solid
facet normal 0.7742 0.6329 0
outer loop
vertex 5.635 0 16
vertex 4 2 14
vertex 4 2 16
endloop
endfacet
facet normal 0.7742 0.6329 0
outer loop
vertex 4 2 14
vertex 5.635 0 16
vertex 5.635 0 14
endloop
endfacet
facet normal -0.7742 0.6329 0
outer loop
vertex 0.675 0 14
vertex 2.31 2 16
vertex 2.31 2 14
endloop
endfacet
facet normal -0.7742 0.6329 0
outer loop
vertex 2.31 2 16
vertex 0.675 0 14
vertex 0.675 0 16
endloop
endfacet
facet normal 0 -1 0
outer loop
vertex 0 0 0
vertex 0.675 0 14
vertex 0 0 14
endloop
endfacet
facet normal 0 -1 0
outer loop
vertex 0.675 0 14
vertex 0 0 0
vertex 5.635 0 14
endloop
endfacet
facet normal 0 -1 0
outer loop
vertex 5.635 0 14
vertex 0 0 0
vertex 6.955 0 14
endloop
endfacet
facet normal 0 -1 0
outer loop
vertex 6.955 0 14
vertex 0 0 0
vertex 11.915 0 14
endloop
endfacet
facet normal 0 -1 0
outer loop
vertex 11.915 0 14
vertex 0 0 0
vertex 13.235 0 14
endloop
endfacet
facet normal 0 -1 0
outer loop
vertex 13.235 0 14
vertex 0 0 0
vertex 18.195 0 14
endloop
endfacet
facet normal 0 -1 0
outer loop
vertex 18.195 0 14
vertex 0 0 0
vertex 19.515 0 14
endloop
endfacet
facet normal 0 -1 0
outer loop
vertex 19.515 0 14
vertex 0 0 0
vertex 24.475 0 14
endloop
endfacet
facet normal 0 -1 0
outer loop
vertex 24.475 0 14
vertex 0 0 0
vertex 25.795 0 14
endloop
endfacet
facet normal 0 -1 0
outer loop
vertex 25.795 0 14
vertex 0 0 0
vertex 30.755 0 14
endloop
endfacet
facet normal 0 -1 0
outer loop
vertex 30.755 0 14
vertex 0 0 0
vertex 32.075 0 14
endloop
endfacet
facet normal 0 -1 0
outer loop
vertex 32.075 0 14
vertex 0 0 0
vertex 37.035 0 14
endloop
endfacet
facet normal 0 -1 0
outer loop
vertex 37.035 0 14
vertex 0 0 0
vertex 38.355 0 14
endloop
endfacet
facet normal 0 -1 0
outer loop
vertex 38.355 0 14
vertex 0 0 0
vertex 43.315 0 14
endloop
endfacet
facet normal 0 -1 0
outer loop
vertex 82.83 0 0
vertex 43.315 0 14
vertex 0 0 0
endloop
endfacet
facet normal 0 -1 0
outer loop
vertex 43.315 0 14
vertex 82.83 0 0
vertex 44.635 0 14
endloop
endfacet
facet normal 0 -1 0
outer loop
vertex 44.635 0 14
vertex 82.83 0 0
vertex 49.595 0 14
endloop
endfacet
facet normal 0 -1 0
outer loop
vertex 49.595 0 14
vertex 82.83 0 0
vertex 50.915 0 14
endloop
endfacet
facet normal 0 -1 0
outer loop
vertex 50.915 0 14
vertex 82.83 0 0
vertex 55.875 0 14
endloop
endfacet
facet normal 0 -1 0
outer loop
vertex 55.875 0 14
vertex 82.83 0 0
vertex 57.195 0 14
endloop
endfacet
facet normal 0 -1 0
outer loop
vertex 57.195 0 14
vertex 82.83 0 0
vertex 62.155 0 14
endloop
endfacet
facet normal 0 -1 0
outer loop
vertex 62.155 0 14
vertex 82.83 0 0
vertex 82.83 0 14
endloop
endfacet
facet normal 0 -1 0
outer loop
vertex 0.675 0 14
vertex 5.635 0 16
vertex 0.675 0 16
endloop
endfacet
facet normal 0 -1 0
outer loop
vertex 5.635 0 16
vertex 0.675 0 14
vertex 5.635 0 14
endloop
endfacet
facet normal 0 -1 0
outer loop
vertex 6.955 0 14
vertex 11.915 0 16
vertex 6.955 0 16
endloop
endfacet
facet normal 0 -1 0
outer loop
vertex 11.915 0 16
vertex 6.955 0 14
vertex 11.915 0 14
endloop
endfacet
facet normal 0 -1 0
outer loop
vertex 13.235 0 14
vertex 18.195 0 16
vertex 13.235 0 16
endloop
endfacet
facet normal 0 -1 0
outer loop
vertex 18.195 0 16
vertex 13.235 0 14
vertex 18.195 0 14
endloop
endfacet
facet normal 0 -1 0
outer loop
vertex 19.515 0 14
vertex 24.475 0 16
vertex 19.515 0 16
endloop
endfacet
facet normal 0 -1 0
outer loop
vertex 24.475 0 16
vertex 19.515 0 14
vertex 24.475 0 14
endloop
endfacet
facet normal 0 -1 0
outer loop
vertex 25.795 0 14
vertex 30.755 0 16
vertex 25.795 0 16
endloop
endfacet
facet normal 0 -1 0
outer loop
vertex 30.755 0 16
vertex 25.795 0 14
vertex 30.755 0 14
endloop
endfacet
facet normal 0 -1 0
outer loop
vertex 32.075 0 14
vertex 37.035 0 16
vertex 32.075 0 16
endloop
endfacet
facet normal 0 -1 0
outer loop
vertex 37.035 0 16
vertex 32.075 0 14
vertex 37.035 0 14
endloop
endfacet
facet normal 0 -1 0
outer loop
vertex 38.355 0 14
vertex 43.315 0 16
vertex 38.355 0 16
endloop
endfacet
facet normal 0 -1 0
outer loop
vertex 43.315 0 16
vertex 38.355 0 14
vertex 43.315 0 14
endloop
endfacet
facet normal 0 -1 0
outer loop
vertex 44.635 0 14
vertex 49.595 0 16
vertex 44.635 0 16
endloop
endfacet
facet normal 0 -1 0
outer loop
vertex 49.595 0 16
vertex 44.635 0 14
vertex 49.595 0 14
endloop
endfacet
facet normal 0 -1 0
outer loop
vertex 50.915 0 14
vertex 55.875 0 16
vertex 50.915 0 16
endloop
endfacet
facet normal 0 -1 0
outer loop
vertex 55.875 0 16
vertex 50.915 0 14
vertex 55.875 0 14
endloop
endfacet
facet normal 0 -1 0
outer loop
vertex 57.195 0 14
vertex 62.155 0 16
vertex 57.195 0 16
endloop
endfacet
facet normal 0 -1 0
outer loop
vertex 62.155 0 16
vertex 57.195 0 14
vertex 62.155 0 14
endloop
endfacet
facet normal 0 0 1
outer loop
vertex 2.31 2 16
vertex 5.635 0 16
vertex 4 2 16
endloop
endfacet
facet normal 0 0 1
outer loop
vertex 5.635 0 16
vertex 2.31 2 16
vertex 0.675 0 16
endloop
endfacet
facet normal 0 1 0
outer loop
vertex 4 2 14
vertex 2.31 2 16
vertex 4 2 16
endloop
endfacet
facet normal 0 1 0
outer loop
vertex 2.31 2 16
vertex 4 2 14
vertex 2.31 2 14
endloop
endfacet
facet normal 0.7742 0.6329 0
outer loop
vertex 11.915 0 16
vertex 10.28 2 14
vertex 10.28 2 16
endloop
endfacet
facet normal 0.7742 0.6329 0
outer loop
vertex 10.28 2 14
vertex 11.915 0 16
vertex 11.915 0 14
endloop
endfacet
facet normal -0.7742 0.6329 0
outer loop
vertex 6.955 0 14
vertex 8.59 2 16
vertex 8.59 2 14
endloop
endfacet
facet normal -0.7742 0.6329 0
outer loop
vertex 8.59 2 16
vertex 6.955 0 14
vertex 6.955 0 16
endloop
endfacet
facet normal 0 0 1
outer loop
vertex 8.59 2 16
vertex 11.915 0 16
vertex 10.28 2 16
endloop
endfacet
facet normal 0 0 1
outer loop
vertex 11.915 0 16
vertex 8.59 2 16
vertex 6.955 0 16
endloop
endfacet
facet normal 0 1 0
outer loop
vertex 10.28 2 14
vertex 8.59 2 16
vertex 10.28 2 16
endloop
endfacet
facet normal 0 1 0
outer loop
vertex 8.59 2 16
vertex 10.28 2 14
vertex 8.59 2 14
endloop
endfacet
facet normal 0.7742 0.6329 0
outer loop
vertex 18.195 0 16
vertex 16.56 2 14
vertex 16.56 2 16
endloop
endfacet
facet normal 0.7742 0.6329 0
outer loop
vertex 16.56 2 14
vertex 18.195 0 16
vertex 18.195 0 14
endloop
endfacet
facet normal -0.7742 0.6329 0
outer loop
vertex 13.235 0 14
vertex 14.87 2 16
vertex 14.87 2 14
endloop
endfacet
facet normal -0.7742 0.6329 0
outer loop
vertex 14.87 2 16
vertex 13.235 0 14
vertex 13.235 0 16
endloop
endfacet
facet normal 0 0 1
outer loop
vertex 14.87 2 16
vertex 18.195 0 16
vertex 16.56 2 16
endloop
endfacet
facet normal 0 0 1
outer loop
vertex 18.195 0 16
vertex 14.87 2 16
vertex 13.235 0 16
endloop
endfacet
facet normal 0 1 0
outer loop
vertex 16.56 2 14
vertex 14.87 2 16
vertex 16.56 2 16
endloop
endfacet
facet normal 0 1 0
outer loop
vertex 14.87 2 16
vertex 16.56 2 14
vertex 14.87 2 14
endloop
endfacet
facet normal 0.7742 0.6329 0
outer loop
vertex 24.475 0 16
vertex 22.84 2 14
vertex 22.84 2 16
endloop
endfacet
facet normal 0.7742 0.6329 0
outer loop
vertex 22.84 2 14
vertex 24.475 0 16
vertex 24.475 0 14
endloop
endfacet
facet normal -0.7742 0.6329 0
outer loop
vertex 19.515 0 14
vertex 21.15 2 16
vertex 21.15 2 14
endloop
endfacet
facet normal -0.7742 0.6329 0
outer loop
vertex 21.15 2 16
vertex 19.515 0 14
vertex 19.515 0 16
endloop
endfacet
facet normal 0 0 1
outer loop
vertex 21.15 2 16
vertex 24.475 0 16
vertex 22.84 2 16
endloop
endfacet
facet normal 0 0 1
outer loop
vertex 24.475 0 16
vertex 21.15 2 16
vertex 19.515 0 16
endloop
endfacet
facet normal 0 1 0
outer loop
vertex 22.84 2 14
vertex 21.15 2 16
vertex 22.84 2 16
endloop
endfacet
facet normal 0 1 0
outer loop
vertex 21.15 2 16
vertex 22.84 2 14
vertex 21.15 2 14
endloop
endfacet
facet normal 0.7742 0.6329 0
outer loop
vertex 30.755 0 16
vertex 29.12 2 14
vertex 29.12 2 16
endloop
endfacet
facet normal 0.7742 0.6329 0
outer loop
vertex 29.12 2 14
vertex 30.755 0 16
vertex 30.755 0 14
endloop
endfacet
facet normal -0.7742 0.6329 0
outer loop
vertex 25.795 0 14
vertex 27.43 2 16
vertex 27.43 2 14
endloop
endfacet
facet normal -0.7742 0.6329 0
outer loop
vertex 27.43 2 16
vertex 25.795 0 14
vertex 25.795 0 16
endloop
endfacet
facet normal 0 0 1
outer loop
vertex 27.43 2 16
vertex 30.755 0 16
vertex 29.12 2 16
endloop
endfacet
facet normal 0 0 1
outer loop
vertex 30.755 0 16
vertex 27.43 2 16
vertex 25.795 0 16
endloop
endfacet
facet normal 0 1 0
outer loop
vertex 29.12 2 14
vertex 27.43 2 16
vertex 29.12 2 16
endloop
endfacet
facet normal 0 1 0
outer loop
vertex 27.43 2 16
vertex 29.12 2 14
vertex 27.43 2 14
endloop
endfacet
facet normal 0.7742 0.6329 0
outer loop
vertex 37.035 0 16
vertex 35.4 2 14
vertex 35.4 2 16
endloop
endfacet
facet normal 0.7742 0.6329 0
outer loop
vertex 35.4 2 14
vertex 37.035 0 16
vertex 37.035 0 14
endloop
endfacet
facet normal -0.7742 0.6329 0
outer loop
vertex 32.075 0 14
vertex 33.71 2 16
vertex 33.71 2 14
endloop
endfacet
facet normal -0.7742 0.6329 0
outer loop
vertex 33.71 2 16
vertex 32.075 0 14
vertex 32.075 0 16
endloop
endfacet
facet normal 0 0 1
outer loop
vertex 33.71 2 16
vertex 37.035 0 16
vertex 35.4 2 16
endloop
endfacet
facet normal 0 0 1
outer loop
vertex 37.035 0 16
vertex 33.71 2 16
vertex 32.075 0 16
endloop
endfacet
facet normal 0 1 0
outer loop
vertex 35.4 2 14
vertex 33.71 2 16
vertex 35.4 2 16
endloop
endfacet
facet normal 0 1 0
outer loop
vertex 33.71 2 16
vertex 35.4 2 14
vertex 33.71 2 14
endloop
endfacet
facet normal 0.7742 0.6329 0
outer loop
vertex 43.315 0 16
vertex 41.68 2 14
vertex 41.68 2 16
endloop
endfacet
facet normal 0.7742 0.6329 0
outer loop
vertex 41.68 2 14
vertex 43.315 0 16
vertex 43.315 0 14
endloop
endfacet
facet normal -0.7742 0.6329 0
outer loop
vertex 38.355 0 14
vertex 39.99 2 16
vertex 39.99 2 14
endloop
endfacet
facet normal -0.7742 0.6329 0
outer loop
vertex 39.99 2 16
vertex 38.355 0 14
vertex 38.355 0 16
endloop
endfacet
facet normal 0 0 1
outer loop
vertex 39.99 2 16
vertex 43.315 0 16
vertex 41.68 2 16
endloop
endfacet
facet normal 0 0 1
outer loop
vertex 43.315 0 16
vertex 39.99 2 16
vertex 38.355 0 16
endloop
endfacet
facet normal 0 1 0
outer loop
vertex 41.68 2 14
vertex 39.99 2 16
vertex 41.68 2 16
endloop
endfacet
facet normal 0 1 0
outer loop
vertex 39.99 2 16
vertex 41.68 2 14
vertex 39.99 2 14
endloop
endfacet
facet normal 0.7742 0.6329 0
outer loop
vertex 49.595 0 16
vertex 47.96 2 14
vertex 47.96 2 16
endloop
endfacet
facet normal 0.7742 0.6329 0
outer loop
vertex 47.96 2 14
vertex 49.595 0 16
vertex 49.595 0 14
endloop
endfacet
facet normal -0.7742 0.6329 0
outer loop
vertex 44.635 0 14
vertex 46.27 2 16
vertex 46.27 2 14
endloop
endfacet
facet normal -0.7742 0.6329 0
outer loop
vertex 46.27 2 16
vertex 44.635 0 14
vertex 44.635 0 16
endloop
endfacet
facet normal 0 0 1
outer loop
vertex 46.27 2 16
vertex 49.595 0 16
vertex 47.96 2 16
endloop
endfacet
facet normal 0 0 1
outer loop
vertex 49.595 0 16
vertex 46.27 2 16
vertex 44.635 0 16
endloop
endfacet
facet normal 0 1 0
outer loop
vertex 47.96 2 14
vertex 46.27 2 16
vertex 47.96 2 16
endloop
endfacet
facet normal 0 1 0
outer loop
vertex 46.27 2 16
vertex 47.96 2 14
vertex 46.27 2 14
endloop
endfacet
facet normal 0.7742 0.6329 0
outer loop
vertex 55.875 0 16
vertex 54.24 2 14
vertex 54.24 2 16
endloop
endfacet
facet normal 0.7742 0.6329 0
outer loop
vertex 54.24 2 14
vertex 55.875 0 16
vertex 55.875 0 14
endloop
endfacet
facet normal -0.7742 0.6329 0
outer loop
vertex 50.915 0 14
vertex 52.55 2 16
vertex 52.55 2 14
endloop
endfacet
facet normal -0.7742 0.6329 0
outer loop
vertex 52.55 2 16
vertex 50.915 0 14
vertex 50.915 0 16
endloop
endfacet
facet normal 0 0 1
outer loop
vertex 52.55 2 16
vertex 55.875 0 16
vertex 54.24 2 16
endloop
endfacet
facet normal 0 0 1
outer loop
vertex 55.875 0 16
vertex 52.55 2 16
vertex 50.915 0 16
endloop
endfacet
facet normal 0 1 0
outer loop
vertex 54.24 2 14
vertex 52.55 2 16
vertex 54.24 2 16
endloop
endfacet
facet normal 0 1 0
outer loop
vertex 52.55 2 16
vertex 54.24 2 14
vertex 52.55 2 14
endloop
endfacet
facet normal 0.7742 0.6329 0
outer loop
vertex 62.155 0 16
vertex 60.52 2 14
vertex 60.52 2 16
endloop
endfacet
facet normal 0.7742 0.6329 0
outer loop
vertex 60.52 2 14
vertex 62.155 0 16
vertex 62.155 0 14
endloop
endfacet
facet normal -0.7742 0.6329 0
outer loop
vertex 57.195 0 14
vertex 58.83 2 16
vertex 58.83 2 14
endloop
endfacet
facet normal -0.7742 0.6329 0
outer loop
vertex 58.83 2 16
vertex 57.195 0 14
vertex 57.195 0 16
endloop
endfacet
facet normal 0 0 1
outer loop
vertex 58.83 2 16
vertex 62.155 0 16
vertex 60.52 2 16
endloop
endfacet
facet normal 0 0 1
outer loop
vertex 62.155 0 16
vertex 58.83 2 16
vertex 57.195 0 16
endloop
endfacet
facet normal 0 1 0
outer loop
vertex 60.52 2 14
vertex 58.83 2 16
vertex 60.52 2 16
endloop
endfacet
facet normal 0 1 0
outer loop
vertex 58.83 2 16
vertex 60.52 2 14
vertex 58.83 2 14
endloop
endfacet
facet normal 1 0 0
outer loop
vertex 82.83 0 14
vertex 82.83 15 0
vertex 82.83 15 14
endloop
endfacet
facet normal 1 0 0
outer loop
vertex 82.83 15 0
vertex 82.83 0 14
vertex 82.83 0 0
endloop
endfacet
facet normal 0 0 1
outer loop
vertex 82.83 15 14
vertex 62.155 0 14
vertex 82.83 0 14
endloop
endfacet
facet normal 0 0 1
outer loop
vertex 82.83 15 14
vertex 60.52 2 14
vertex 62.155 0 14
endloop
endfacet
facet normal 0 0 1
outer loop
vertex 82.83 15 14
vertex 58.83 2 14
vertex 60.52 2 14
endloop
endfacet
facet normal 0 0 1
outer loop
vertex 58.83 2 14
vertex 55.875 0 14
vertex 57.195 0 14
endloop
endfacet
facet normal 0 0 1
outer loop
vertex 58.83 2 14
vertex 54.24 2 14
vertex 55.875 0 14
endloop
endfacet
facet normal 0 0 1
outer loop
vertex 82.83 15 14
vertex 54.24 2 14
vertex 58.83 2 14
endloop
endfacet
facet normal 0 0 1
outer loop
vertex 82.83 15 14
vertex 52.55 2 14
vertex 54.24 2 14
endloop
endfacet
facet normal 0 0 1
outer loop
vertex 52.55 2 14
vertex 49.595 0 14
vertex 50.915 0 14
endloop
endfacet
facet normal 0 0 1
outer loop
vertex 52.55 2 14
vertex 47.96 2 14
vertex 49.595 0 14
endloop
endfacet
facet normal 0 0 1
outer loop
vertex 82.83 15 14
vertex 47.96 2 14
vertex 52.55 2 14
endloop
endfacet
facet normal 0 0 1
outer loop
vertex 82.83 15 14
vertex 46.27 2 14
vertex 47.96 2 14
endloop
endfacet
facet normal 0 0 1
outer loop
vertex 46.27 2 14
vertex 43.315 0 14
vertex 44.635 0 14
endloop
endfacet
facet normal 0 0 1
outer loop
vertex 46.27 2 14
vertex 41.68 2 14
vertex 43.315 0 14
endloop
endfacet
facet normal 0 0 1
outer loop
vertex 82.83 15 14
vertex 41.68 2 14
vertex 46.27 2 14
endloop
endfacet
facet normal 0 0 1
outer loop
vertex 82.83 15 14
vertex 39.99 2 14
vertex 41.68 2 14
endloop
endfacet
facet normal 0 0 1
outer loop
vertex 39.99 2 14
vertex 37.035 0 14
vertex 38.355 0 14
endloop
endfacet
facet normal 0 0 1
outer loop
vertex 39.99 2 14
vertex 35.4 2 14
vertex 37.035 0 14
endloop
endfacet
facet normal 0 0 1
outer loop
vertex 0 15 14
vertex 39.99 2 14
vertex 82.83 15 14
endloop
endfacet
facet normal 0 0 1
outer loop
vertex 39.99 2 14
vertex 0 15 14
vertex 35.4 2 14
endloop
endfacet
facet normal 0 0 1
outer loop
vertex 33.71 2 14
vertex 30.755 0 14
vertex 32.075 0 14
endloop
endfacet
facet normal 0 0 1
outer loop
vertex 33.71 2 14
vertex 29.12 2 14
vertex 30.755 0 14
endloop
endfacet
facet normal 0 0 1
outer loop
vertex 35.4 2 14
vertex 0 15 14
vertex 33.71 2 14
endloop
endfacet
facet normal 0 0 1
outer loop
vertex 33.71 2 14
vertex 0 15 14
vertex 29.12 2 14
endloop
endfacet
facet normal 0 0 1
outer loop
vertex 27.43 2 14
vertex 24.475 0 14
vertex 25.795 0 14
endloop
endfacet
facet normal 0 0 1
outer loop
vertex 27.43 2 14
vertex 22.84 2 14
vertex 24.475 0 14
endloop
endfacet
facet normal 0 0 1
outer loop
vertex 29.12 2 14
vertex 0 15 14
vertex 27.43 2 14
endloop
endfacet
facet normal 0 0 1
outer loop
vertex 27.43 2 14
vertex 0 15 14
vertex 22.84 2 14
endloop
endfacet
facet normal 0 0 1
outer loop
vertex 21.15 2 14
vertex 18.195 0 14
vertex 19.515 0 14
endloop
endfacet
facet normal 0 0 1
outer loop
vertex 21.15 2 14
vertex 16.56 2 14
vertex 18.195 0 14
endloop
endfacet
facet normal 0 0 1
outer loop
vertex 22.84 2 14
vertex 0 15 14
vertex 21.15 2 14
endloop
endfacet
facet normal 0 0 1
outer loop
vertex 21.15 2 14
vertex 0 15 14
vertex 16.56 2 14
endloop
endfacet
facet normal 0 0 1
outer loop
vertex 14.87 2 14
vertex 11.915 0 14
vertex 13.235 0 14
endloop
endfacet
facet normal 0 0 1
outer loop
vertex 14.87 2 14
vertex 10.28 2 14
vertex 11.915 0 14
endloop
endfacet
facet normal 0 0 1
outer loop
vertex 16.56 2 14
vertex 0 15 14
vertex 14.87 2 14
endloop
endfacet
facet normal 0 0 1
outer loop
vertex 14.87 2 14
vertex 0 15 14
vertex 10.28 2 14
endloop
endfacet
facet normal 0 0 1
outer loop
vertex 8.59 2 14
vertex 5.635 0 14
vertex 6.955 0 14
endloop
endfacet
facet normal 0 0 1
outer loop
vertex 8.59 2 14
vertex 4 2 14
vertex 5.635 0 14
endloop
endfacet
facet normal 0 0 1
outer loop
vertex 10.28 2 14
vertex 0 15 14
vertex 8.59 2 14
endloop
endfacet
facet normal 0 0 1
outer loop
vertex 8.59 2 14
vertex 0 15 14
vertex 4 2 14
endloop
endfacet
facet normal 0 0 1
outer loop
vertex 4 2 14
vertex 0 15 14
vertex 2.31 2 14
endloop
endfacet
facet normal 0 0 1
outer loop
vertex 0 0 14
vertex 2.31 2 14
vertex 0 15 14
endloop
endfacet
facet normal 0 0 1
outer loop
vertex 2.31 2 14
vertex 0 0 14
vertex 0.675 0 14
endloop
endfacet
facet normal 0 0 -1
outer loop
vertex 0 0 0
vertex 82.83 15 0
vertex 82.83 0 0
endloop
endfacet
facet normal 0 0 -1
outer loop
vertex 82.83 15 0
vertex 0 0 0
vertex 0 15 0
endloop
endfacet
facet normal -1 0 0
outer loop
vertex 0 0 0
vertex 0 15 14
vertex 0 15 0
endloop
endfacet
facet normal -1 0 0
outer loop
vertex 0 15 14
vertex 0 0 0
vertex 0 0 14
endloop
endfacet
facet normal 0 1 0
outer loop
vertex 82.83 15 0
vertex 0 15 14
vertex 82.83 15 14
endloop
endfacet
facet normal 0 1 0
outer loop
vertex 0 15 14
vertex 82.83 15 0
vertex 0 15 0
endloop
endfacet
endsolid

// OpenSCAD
$fn = 32;

// ----------------------------------------------------------------------
// Gear rack: m=2 z=10, 82.83 x 15 x 16 mm
// ----------------------------------------------------------------------

// --- parameters (mm) ---
bar_len = 82.83;          // rack length, X
bar_w = 15;               // rack width, Y
bar_h = 16;               // overall height, Z
gear_module = 2;          // module
base_t = 14;              // tooth root line height
pitch = 6.28;             // circular pitch
tip_w = 1.69;             // tooth thickness at the tip
root_w = 4.96;            // tooth thickness at the root line
sink = 0.6;               // tooth root overlap into the body

tooth_span = 62.83;

module tooth(x0) {
  /* 20 deg flank profile, sunk into the body for a positive overlap */
  translate([x0, 0, base_t - sink])
    linear_extrude(height = bar_h - base_t + sink)
      polygon(points = [[-root_w / 2, 0], [root_w / 2, 0],
                        [tip_w / 2, bar_h - base_t],
                        [-tip_w / 2, bar_h - base_t]]);
}

difference() {
  union() {
    cube([bar_len, bar_w, base_t]);
    for (i = [0 : 10 - 1])
      tooth((i + 0.5) * pitch + (tooth_span - 10 * pitch) / 2);
  }
}
